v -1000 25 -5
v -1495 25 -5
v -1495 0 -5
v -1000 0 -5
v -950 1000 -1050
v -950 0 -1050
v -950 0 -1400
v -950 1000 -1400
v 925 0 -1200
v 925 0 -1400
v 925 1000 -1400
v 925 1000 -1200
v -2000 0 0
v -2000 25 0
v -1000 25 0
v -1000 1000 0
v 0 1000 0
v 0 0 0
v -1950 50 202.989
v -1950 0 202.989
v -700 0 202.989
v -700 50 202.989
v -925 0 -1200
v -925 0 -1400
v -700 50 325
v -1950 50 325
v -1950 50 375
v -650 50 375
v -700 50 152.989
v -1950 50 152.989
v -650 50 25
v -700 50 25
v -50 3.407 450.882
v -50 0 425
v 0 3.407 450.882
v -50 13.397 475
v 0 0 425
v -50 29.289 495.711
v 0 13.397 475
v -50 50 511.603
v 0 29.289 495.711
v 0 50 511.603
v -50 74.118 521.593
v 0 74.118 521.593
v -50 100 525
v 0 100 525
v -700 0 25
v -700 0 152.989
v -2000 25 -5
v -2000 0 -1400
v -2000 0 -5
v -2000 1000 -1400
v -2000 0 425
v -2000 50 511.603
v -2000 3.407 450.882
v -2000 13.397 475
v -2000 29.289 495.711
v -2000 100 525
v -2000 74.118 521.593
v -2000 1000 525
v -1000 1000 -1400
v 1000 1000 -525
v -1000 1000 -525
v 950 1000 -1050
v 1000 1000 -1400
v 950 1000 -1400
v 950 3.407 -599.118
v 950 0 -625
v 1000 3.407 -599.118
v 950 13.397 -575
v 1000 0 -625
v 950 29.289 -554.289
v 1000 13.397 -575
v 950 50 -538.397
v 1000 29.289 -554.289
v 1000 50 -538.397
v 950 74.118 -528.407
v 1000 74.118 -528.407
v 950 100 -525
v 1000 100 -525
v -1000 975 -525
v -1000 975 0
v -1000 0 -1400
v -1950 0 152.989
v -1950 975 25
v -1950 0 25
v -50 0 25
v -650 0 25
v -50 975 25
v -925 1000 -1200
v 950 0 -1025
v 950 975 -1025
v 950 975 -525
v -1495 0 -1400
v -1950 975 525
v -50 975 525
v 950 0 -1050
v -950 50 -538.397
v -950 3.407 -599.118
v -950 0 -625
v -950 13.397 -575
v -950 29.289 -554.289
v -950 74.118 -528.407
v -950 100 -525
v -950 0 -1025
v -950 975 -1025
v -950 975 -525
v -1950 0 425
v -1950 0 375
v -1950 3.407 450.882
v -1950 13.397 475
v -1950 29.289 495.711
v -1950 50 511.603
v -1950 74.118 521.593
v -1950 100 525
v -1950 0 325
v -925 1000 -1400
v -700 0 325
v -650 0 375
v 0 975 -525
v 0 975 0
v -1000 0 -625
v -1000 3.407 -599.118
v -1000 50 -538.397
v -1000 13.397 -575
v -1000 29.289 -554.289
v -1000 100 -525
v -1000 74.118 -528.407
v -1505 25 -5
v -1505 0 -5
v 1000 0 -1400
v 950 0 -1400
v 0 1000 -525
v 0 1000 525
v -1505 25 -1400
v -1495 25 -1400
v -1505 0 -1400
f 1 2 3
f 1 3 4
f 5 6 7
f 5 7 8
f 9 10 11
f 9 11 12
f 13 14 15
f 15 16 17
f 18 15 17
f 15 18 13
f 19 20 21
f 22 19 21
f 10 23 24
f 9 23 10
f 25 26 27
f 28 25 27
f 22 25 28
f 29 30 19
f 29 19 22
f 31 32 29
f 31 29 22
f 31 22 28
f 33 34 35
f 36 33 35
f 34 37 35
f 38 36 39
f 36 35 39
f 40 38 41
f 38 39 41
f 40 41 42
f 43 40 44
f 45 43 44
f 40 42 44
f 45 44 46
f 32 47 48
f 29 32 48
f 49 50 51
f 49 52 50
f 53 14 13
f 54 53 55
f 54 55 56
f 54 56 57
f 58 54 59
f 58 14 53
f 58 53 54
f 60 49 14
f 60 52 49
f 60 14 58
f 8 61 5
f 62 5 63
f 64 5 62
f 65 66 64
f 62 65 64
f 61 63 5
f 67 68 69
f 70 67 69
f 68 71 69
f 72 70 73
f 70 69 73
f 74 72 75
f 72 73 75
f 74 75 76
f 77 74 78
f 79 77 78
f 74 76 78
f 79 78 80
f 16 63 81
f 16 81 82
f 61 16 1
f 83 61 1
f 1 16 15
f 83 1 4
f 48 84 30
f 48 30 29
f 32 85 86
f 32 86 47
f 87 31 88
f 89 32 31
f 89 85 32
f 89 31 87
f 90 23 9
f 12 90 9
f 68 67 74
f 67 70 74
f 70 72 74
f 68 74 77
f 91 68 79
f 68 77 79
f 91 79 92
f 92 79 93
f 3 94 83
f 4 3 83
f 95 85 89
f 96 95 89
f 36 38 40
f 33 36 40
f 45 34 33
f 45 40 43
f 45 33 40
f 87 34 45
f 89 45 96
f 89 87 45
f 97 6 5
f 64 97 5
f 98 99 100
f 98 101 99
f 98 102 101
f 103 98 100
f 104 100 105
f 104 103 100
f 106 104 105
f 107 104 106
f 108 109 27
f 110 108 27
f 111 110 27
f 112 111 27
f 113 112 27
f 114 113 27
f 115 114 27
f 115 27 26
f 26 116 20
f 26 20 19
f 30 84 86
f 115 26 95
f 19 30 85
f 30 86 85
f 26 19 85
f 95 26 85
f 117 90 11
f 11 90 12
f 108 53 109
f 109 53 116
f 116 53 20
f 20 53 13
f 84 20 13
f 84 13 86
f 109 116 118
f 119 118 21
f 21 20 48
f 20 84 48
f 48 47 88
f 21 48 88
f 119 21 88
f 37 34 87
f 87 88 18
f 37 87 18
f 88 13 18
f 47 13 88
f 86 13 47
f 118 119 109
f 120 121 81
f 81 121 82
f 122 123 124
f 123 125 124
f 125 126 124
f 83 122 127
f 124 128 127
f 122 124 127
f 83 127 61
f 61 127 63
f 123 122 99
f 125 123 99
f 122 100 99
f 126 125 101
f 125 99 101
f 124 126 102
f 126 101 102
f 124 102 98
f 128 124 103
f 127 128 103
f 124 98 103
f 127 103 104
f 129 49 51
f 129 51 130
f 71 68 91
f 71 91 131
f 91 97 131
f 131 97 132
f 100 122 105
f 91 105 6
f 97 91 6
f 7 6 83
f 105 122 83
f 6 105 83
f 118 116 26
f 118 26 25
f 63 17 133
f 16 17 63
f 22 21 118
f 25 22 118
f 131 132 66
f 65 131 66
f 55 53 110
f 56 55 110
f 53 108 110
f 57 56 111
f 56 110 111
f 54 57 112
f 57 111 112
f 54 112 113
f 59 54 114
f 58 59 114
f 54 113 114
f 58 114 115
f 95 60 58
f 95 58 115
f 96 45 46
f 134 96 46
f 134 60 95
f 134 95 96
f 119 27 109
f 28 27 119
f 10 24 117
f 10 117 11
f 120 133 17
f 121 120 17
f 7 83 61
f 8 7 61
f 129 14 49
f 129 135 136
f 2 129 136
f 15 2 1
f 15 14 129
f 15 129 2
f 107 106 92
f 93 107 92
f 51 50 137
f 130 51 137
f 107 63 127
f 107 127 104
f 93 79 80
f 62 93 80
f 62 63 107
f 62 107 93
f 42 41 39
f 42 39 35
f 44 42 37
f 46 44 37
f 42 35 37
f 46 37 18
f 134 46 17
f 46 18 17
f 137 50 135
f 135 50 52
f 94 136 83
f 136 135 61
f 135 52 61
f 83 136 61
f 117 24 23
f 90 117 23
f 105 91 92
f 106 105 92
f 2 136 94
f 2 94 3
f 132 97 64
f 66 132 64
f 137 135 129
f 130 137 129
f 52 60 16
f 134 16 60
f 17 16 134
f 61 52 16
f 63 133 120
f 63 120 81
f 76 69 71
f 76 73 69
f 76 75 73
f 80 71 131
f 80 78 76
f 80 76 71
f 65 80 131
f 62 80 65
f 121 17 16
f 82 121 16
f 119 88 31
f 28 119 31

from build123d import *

# Parameters (mm, degrees)
F0_W      = 2000
F0_H      = 1000
F1_DEPTH  = 25
F2_W      = 50
F2_H      = 1000
F3_DEPTH  = 500
F4_W      = 50
F4_H      = 1000
F5_DEPTH  = 500
F6_R      = 100
F7_W      = 1300
F7_H      = 50
F8_DEPTH  = 350
F9_W      = 1250
F9_H      = 122.0108807087
F9_H_2    = 127.9891192913
F10_DEPTH = 1000.001
F11_W     = 1000
F11_H     = 975
F12_DEPTH = 1400
F13_W     = 495
F13_H     = 1395
F14_DEPTH = 25
F15_W     = 1900
F15_H     = 25
F16_DEPTH = 500
F17_W     = 1000
F17_H     = 875
F18_DEPTH = 50
F19_W     = 1000
F19_H     = 25
F20_DEPTH = 1900
F21_W     = 1000
F21_H     = 500
F21_H_2   = 25
F21_H_3   = 350
F22_DEPTH = 50
F23_R     = 100
F24_W     = 1900
F24_H     = 25
F25_DEPTH = 500
F26_W     = 1000
F26_H     = 525
F27_DEPTH = 25
F28_W     = 1850
F28_H     = 200
F29_DEPTH = 1000


with BuildPart() as f1:
    # F0 (on Top) → F1 (new body)
    with BuildSketch(Plane.XY):
        with Locations((-1000, 500)):
            Rectangle(F0_W, F0_H)
    extrude(amount=F1_DEPTH)

    # F2 (on face) → F3 (join)
    with BuildSketch(Plane.XY.offset(25)):
        with Locations((-25, 500)):
            Rectangle(F2_W, F2_H)
    extrude(amount=F3_DEPTH)

    # F4 (on face) → F5 (join)
    with BuildSketch(Plane.XY.offset(25)):
        with Locations((-1975, 500)):
            Rectangle(F4_W, F4_H)
    extrude(amount=F5_DEPTH)

    # F6
    f6_edges = [f1.edges().sort_by_distance(p)[0] for p in [
        (-1975, 0, 525),
        (-25, 0, 525),
    ]]
    fillet(f6_edges, radius=F6_R)

    # F7 (on face) → F8 (join)
    with BuildSketch(Plane.XY.offset(25)):
        with Locations((-1300, 25)):
            Rectangle(F7_W, F7_H)
    extrude(amount=F8_DEPTH)

    # F9 (on face) → F10 (cut, through all)
    with BuildSketch(Plane.XZ):
        with Locations((-1325, 263.9945596457)):
            Rectangle(F9_W, F9_H)
        with Locations((-1325, 88.9945596457)):
            Rectangle(F9_W, F9_H_2)
    extrude(amount=-F10_DEPTH, mode=Mode.SUBTRACT)

    # F11 (on face) → F12 (join)
    with BuildSketch(Plane(origin=(0, 0, 0), x_dir=(1, 0, 0), z_dir=(0, 0, -1))):
        with Locations((-1500, -512.5)):
            Rectangle(F11_W, F11_H)
    extrude(amount=F12_DEPTH)

    # F13 (on face) → F14 (join)
    with BuildSketch(Plane.XZ.offset(-25)):
        with Locations((-1752.5, -702.5)):
            Rectangle(F13_W, F13_H)
        with Locations((-1247.5, -702.5)):
            Rectangle(F13_W, F13_H)
    extrude(amount=F14_DEPTH)

    # F15 (on face) → F16 (join)
    with BuildSketch(Plane.XY.offset(25)):
        with Locations((-1000, 987.5)):
            Rectangle(F15_W, F15_H)
    extrude(amount=F16_DEPTH)


with BuildPart() as f18:
    # F17 (on face) → F18 (new body)
    with BuildSketch(Plane.YZ.offset(-1000)):
        with Locations((500, -962.5)):
            Rectangle(F17_W, F17_H)
    extrude(amount=F18_DEPTH)

    # F19 (on face) → F20 (join)
    with BuildSketch(Plane.YZ.offset(-950)):
        with Locations((500, -1037.5)):
            Rectangle(F19_W, F19_H)
    extrude(amount=F20_DEPTH)

    # F21 (on face) → F22 (join)
    with BuildSketch(Plane.YZ.offset(950)):
        with Locations((500, -775)):
            Rectangle(F21_W, F21_H)
        with Locations((500, -1037.5)):
            Rectangle(F21_W, F21_H_2)
        with Locations((500, -1225)):
            Rectangle(F21_W, F21_H_3)
    extrude(amount=F22_DEPTH)

    # F23
    f23_edges = [f18.edges().sort_by_distance(p)[0] for p in [
        (-975, 0, -525),
        (975, 0, -525),
    ]]
    fillet(f23_edges, radius=F23_R)

    # F24 (on face) → F25 (join)
    with BuildSketch(Plane.XY.offset(-1025)):
        with Locations((0, 987.5)):
            Rectangle(F24_W, F24_H)
    extrude(amount=F25_DEPTH)


with BuildPart() as f27:
    # F26 (on face) → F27 (new body)
    with BuildSketch(Plane(origin=(0, 1000, 0), x_dir=(-1, 0, 0), z_dir=(0, 1, 0))):
        with Locations((500, -262.5)):
            Rectangle(F26_W, F26_H)
    extrude(amount=-F27_DEPTH)


with BuildPart() as f29:
    # F28 (on face) → F29 (new body, through all)
    with BuildSketch(Plane.XZ):
        with Locations((0, -1300)):
            Rectangle(F28_W, F28_H)
    extrude(amount=-F29_DEPTH)


solid = Compound([f1.part, f18.part, f27.part, f29.part])
